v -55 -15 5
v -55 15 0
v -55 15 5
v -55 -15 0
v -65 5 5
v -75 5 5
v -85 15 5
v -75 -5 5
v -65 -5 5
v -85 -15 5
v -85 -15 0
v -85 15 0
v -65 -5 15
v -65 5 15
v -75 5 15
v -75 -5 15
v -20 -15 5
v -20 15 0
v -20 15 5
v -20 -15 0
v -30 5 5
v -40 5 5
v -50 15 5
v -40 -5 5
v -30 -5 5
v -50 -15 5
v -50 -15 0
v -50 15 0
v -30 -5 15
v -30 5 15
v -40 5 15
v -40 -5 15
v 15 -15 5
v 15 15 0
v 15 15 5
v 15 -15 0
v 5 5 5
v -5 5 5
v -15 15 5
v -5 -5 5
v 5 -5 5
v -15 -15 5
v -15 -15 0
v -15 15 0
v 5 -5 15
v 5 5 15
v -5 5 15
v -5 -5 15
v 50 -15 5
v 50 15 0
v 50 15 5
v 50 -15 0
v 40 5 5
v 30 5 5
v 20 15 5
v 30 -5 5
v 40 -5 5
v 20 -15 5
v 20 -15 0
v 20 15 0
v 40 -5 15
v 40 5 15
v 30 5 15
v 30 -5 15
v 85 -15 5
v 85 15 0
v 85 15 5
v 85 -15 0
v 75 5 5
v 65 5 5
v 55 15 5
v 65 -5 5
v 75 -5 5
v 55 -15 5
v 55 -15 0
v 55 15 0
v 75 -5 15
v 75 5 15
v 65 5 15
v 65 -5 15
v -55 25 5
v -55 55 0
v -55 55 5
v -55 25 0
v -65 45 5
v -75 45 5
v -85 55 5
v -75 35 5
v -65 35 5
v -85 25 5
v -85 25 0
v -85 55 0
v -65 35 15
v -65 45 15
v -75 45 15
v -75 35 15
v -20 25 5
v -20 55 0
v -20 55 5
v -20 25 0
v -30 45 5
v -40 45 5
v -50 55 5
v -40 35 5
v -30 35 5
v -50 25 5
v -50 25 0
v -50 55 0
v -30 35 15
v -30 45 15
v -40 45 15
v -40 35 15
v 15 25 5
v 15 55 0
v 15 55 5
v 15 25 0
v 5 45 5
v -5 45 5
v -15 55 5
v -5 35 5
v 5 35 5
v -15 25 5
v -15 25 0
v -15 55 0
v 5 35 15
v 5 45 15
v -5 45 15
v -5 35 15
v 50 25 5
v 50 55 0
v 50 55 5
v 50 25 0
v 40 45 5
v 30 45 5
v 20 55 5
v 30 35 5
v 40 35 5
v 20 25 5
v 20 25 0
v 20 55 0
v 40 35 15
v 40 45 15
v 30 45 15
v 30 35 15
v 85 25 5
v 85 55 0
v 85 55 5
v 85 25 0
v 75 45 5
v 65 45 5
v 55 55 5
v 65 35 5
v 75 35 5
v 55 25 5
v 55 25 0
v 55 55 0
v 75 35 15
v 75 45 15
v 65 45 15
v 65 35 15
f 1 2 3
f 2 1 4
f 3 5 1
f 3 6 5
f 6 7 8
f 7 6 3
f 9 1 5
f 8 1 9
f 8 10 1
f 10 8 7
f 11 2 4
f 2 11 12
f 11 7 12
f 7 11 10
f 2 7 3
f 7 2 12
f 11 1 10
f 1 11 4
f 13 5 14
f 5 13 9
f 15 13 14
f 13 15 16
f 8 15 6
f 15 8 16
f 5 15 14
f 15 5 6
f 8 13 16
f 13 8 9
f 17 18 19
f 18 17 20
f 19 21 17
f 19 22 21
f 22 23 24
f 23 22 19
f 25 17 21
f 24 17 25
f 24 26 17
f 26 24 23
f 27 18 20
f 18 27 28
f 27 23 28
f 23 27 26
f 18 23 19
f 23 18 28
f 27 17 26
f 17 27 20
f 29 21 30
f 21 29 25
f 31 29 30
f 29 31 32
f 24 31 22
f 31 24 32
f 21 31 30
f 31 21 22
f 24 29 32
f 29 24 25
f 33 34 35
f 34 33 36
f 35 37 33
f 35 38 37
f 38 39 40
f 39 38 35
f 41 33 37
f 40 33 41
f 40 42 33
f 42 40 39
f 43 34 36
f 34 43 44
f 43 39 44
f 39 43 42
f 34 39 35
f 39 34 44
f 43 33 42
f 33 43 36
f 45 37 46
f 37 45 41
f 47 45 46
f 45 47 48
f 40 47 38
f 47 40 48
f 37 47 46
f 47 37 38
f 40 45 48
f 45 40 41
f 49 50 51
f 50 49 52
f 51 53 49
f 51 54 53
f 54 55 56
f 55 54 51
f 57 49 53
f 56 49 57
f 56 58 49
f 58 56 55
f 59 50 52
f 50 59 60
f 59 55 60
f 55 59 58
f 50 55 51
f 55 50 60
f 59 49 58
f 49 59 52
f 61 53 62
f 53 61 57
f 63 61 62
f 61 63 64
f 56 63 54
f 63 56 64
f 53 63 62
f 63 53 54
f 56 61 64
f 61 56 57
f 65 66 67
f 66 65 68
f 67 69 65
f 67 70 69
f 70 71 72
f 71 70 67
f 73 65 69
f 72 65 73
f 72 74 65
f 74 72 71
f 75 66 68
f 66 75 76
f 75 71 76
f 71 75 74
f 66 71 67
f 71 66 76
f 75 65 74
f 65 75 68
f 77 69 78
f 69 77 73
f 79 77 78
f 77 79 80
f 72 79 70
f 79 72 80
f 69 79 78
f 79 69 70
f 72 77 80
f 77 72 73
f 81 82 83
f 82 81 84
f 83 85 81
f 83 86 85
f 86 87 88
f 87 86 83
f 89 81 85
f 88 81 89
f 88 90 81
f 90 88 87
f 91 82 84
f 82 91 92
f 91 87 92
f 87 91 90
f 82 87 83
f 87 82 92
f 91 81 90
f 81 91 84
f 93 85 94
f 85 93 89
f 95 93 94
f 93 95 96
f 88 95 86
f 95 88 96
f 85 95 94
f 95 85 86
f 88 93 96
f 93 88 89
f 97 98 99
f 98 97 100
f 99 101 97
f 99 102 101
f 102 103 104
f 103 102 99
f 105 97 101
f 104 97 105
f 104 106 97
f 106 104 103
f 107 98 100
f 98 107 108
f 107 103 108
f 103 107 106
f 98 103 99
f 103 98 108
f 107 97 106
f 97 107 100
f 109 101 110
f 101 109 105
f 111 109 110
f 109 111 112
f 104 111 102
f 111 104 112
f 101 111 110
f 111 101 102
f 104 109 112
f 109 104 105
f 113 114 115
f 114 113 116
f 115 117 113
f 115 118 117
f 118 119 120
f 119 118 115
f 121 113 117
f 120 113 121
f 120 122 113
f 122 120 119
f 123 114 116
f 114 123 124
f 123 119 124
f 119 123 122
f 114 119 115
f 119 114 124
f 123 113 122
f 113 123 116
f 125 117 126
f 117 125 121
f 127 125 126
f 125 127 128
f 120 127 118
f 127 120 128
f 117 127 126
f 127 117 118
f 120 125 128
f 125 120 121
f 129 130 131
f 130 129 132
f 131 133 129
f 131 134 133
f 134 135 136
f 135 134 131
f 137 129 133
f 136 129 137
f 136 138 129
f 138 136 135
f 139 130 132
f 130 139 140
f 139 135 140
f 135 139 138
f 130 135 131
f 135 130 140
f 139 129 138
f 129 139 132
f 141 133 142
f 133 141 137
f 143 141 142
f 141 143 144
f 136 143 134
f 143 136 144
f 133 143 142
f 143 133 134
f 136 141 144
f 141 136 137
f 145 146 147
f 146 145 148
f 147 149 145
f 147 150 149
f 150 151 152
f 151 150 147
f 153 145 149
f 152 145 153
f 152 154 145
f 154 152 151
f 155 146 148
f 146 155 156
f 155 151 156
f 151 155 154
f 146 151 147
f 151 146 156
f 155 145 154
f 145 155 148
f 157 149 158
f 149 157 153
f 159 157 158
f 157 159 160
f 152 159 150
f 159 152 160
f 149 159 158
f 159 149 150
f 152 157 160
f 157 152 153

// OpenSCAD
module holder(x = 0, y = 0) {
    translate([x,y,0]) {
        difference() {
            union() {
                cube([30,30,5]);
                translate([10,10,5]) cube([10,10,10]);
            }
        }
    }
}

module holderHalf(x = 0, y = 0) {
    translate([x,y,0]) {
        difference() {
            union() {
                cube([30,20,5]);
                translate([10,10,5]) cube([10,10,10]);
            }
        }
    }
}

holder(-85, -15);
holder(-50, -15);
holder(-15,-15);
holder(20, -15);
holder(55, -15);

holder(-85, 25);
holder(-50, 25);
holder(-15, 25);
holder(20, 25);
holder(55, 25);
